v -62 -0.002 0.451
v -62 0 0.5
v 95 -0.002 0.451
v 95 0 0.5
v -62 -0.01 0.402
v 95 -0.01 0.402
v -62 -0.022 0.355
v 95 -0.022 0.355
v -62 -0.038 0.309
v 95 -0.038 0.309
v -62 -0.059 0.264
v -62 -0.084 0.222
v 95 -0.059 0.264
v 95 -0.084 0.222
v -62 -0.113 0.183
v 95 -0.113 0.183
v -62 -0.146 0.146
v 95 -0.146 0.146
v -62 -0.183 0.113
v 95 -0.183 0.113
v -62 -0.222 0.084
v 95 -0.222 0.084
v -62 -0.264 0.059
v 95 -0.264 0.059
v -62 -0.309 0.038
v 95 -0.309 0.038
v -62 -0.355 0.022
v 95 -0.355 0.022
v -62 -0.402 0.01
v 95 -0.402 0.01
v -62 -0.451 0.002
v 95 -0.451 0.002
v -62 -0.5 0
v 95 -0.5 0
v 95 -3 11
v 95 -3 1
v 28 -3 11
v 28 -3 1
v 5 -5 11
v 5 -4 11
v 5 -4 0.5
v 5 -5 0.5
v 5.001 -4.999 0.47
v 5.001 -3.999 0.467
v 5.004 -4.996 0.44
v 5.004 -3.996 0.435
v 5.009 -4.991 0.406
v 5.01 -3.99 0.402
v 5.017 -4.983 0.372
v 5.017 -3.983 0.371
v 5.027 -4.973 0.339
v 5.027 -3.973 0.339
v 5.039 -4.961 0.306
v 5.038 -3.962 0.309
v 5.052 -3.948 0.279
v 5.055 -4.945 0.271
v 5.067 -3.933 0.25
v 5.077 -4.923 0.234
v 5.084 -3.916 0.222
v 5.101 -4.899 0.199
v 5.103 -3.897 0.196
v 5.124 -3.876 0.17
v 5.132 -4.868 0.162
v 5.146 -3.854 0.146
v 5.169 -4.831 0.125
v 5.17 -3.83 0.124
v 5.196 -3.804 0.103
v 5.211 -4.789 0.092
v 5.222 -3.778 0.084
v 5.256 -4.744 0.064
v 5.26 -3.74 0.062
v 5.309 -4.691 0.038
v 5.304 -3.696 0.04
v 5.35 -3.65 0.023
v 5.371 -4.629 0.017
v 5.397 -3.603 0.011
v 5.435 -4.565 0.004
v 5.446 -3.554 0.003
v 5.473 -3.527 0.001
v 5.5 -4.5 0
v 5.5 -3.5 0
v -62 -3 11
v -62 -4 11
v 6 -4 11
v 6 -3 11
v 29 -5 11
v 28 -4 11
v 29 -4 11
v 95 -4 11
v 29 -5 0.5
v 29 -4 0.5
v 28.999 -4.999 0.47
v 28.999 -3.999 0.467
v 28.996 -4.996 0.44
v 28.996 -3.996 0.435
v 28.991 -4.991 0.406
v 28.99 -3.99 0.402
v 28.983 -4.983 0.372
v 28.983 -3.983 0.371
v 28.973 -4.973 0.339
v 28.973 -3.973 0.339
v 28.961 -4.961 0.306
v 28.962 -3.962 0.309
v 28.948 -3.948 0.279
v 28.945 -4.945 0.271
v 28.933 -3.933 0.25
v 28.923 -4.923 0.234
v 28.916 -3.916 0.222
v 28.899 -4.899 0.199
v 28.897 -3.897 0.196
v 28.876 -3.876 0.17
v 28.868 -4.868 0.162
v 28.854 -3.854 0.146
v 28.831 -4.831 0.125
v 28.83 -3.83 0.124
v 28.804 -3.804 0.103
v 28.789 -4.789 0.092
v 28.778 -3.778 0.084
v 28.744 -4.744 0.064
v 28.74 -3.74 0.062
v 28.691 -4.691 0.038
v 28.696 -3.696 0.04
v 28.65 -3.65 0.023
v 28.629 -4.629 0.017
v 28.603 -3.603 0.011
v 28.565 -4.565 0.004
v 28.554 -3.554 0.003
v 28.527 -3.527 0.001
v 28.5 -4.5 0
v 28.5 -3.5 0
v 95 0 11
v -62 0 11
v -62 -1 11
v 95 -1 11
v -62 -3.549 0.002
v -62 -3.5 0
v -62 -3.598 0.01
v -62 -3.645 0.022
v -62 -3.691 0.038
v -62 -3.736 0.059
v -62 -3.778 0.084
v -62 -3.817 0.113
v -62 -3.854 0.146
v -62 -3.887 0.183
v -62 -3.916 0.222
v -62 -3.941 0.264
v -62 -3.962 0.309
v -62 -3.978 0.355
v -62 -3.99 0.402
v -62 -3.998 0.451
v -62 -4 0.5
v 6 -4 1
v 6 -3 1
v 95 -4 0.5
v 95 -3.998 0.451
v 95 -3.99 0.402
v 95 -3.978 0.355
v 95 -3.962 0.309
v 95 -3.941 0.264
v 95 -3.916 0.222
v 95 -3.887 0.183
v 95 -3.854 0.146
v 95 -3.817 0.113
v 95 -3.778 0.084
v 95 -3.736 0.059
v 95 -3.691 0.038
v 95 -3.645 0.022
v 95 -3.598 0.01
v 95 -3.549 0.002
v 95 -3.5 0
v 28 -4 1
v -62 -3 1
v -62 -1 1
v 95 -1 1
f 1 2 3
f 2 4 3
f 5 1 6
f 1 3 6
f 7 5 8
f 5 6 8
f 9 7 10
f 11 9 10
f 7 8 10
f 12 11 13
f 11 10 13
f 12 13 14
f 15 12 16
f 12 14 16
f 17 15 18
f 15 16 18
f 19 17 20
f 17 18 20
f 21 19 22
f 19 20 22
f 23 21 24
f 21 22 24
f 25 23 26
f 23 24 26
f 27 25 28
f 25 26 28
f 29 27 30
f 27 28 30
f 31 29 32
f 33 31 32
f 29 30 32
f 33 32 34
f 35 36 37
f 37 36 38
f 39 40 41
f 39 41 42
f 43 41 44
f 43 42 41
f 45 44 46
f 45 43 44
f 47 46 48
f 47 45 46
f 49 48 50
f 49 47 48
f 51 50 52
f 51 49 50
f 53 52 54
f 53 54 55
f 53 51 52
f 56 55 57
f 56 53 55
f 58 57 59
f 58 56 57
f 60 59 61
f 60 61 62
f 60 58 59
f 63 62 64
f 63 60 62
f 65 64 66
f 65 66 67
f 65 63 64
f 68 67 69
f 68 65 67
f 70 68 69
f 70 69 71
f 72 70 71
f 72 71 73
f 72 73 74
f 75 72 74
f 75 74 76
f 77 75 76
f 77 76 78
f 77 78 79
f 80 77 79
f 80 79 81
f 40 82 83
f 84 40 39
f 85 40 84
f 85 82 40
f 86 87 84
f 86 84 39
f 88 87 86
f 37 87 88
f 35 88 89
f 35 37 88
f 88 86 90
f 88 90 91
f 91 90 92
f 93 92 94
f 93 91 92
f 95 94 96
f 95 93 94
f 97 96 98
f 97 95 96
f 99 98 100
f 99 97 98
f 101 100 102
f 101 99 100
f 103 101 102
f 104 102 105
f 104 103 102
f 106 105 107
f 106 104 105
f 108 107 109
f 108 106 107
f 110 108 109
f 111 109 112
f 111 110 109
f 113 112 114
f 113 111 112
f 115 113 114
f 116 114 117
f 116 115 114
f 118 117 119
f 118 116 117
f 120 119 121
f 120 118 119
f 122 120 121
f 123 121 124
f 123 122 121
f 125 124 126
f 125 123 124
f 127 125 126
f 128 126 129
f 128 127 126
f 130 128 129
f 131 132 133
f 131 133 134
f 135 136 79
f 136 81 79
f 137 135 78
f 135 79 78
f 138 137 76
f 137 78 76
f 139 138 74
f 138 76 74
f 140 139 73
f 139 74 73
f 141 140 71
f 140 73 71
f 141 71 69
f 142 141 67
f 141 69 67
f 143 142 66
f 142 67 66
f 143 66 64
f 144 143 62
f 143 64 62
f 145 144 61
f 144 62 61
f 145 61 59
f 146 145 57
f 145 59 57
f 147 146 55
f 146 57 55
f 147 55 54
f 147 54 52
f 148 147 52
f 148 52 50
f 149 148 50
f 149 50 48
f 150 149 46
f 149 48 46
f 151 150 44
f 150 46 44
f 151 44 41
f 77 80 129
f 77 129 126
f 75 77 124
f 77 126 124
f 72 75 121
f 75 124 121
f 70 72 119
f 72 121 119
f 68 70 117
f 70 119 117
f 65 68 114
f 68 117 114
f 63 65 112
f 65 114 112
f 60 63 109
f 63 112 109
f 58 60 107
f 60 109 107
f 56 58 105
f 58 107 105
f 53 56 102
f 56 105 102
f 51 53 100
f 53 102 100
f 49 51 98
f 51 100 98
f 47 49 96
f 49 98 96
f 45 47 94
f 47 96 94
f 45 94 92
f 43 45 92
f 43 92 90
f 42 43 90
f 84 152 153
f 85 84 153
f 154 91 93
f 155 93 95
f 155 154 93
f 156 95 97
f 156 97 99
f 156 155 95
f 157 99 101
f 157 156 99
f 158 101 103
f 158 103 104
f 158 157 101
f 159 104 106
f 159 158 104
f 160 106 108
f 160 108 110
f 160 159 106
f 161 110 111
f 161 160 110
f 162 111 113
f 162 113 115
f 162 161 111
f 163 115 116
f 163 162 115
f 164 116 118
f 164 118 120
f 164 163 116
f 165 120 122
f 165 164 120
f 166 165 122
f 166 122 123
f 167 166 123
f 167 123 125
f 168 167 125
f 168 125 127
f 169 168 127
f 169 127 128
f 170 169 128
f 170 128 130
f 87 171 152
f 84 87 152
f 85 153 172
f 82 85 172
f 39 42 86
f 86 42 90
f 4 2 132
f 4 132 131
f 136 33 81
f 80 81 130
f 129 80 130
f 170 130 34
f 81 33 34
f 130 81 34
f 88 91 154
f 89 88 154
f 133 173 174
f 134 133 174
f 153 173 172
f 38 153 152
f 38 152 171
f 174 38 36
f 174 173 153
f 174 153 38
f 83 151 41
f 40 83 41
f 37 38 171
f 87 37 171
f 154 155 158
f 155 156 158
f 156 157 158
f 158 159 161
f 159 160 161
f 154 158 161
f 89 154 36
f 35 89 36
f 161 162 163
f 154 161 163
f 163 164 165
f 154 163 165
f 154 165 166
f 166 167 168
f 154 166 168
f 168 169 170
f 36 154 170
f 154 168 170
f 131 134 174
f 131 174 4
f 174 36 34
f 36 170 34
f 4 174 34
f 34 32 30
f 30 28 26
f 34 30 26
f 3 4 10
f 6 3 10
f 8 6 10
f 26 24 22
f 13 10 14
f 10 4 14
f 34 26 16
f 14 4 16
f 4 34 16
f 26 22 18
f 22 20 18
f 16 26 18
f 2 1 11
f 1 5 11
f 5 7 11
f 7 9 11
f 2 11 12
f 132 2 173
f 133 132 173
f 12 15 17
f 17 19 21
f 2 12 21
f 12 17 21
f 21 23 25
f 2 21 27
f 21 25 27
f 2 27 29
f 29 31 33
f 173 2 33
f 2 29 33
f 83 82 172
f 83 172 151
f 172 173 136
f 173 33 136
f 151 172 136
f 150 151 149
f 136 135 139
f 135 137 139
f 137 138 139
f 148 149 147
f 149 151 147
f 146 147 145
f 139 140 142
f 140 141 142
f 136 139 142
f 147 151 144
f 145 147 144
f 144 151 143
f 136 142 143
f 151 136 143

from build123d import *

# Parameters (mm, degrees)
F0_W     = 22
F0_H     = 1
F1_DEPTH = 1
F0_W_2   = 157
F2_DEPTH = 11
F3_R     = 0.5


with BuildPart() as f1:
    # F0 (on Top) → F1 (new body)
    with BuildSketch(Plane.XY):
        Polygon((95, -1), (-62, -1), (-62, -3), (6, -3), (28, -3), (95, -3), align=None)
        with Locations((17, -3.5)):
            Rectangle(F0_W, F0_H)
    extrude(amount=F1_DEPTH)

    # F0 (on Top) → F2 (join)
    with BuildSketch(Plane.XY):
        Polygon((6, -4), (5, -4), (5, -5), (29, -5), (29, -4), (28, -4), align=None)
        Polygon((6, -3), (-62, -3), (-62, -4), (5, -4), (6, -4), align=None)
        Polygon((95, -4), (95, -3), (28, -3), (28, -4), (29, -4), align=None)
        with Locations((16.5, -0.5)):
            Rectangle(F0_W_2, F0_H)
    extrude(amount=F2_DEPTH)

    # F3
    f3_edges = [f1.edges().sort_by_distance(p)[0] for p in [
        (17, -5, 0),
        (5, -4.5, 0),
        (-28.5, -4, 0),
        (62, -4, 0),
        (29, -4.5, 0),
        (16.5, 0, 0),
    ]]
    fillet(f3_edges, radius=F3_R)


solid = f1.part
